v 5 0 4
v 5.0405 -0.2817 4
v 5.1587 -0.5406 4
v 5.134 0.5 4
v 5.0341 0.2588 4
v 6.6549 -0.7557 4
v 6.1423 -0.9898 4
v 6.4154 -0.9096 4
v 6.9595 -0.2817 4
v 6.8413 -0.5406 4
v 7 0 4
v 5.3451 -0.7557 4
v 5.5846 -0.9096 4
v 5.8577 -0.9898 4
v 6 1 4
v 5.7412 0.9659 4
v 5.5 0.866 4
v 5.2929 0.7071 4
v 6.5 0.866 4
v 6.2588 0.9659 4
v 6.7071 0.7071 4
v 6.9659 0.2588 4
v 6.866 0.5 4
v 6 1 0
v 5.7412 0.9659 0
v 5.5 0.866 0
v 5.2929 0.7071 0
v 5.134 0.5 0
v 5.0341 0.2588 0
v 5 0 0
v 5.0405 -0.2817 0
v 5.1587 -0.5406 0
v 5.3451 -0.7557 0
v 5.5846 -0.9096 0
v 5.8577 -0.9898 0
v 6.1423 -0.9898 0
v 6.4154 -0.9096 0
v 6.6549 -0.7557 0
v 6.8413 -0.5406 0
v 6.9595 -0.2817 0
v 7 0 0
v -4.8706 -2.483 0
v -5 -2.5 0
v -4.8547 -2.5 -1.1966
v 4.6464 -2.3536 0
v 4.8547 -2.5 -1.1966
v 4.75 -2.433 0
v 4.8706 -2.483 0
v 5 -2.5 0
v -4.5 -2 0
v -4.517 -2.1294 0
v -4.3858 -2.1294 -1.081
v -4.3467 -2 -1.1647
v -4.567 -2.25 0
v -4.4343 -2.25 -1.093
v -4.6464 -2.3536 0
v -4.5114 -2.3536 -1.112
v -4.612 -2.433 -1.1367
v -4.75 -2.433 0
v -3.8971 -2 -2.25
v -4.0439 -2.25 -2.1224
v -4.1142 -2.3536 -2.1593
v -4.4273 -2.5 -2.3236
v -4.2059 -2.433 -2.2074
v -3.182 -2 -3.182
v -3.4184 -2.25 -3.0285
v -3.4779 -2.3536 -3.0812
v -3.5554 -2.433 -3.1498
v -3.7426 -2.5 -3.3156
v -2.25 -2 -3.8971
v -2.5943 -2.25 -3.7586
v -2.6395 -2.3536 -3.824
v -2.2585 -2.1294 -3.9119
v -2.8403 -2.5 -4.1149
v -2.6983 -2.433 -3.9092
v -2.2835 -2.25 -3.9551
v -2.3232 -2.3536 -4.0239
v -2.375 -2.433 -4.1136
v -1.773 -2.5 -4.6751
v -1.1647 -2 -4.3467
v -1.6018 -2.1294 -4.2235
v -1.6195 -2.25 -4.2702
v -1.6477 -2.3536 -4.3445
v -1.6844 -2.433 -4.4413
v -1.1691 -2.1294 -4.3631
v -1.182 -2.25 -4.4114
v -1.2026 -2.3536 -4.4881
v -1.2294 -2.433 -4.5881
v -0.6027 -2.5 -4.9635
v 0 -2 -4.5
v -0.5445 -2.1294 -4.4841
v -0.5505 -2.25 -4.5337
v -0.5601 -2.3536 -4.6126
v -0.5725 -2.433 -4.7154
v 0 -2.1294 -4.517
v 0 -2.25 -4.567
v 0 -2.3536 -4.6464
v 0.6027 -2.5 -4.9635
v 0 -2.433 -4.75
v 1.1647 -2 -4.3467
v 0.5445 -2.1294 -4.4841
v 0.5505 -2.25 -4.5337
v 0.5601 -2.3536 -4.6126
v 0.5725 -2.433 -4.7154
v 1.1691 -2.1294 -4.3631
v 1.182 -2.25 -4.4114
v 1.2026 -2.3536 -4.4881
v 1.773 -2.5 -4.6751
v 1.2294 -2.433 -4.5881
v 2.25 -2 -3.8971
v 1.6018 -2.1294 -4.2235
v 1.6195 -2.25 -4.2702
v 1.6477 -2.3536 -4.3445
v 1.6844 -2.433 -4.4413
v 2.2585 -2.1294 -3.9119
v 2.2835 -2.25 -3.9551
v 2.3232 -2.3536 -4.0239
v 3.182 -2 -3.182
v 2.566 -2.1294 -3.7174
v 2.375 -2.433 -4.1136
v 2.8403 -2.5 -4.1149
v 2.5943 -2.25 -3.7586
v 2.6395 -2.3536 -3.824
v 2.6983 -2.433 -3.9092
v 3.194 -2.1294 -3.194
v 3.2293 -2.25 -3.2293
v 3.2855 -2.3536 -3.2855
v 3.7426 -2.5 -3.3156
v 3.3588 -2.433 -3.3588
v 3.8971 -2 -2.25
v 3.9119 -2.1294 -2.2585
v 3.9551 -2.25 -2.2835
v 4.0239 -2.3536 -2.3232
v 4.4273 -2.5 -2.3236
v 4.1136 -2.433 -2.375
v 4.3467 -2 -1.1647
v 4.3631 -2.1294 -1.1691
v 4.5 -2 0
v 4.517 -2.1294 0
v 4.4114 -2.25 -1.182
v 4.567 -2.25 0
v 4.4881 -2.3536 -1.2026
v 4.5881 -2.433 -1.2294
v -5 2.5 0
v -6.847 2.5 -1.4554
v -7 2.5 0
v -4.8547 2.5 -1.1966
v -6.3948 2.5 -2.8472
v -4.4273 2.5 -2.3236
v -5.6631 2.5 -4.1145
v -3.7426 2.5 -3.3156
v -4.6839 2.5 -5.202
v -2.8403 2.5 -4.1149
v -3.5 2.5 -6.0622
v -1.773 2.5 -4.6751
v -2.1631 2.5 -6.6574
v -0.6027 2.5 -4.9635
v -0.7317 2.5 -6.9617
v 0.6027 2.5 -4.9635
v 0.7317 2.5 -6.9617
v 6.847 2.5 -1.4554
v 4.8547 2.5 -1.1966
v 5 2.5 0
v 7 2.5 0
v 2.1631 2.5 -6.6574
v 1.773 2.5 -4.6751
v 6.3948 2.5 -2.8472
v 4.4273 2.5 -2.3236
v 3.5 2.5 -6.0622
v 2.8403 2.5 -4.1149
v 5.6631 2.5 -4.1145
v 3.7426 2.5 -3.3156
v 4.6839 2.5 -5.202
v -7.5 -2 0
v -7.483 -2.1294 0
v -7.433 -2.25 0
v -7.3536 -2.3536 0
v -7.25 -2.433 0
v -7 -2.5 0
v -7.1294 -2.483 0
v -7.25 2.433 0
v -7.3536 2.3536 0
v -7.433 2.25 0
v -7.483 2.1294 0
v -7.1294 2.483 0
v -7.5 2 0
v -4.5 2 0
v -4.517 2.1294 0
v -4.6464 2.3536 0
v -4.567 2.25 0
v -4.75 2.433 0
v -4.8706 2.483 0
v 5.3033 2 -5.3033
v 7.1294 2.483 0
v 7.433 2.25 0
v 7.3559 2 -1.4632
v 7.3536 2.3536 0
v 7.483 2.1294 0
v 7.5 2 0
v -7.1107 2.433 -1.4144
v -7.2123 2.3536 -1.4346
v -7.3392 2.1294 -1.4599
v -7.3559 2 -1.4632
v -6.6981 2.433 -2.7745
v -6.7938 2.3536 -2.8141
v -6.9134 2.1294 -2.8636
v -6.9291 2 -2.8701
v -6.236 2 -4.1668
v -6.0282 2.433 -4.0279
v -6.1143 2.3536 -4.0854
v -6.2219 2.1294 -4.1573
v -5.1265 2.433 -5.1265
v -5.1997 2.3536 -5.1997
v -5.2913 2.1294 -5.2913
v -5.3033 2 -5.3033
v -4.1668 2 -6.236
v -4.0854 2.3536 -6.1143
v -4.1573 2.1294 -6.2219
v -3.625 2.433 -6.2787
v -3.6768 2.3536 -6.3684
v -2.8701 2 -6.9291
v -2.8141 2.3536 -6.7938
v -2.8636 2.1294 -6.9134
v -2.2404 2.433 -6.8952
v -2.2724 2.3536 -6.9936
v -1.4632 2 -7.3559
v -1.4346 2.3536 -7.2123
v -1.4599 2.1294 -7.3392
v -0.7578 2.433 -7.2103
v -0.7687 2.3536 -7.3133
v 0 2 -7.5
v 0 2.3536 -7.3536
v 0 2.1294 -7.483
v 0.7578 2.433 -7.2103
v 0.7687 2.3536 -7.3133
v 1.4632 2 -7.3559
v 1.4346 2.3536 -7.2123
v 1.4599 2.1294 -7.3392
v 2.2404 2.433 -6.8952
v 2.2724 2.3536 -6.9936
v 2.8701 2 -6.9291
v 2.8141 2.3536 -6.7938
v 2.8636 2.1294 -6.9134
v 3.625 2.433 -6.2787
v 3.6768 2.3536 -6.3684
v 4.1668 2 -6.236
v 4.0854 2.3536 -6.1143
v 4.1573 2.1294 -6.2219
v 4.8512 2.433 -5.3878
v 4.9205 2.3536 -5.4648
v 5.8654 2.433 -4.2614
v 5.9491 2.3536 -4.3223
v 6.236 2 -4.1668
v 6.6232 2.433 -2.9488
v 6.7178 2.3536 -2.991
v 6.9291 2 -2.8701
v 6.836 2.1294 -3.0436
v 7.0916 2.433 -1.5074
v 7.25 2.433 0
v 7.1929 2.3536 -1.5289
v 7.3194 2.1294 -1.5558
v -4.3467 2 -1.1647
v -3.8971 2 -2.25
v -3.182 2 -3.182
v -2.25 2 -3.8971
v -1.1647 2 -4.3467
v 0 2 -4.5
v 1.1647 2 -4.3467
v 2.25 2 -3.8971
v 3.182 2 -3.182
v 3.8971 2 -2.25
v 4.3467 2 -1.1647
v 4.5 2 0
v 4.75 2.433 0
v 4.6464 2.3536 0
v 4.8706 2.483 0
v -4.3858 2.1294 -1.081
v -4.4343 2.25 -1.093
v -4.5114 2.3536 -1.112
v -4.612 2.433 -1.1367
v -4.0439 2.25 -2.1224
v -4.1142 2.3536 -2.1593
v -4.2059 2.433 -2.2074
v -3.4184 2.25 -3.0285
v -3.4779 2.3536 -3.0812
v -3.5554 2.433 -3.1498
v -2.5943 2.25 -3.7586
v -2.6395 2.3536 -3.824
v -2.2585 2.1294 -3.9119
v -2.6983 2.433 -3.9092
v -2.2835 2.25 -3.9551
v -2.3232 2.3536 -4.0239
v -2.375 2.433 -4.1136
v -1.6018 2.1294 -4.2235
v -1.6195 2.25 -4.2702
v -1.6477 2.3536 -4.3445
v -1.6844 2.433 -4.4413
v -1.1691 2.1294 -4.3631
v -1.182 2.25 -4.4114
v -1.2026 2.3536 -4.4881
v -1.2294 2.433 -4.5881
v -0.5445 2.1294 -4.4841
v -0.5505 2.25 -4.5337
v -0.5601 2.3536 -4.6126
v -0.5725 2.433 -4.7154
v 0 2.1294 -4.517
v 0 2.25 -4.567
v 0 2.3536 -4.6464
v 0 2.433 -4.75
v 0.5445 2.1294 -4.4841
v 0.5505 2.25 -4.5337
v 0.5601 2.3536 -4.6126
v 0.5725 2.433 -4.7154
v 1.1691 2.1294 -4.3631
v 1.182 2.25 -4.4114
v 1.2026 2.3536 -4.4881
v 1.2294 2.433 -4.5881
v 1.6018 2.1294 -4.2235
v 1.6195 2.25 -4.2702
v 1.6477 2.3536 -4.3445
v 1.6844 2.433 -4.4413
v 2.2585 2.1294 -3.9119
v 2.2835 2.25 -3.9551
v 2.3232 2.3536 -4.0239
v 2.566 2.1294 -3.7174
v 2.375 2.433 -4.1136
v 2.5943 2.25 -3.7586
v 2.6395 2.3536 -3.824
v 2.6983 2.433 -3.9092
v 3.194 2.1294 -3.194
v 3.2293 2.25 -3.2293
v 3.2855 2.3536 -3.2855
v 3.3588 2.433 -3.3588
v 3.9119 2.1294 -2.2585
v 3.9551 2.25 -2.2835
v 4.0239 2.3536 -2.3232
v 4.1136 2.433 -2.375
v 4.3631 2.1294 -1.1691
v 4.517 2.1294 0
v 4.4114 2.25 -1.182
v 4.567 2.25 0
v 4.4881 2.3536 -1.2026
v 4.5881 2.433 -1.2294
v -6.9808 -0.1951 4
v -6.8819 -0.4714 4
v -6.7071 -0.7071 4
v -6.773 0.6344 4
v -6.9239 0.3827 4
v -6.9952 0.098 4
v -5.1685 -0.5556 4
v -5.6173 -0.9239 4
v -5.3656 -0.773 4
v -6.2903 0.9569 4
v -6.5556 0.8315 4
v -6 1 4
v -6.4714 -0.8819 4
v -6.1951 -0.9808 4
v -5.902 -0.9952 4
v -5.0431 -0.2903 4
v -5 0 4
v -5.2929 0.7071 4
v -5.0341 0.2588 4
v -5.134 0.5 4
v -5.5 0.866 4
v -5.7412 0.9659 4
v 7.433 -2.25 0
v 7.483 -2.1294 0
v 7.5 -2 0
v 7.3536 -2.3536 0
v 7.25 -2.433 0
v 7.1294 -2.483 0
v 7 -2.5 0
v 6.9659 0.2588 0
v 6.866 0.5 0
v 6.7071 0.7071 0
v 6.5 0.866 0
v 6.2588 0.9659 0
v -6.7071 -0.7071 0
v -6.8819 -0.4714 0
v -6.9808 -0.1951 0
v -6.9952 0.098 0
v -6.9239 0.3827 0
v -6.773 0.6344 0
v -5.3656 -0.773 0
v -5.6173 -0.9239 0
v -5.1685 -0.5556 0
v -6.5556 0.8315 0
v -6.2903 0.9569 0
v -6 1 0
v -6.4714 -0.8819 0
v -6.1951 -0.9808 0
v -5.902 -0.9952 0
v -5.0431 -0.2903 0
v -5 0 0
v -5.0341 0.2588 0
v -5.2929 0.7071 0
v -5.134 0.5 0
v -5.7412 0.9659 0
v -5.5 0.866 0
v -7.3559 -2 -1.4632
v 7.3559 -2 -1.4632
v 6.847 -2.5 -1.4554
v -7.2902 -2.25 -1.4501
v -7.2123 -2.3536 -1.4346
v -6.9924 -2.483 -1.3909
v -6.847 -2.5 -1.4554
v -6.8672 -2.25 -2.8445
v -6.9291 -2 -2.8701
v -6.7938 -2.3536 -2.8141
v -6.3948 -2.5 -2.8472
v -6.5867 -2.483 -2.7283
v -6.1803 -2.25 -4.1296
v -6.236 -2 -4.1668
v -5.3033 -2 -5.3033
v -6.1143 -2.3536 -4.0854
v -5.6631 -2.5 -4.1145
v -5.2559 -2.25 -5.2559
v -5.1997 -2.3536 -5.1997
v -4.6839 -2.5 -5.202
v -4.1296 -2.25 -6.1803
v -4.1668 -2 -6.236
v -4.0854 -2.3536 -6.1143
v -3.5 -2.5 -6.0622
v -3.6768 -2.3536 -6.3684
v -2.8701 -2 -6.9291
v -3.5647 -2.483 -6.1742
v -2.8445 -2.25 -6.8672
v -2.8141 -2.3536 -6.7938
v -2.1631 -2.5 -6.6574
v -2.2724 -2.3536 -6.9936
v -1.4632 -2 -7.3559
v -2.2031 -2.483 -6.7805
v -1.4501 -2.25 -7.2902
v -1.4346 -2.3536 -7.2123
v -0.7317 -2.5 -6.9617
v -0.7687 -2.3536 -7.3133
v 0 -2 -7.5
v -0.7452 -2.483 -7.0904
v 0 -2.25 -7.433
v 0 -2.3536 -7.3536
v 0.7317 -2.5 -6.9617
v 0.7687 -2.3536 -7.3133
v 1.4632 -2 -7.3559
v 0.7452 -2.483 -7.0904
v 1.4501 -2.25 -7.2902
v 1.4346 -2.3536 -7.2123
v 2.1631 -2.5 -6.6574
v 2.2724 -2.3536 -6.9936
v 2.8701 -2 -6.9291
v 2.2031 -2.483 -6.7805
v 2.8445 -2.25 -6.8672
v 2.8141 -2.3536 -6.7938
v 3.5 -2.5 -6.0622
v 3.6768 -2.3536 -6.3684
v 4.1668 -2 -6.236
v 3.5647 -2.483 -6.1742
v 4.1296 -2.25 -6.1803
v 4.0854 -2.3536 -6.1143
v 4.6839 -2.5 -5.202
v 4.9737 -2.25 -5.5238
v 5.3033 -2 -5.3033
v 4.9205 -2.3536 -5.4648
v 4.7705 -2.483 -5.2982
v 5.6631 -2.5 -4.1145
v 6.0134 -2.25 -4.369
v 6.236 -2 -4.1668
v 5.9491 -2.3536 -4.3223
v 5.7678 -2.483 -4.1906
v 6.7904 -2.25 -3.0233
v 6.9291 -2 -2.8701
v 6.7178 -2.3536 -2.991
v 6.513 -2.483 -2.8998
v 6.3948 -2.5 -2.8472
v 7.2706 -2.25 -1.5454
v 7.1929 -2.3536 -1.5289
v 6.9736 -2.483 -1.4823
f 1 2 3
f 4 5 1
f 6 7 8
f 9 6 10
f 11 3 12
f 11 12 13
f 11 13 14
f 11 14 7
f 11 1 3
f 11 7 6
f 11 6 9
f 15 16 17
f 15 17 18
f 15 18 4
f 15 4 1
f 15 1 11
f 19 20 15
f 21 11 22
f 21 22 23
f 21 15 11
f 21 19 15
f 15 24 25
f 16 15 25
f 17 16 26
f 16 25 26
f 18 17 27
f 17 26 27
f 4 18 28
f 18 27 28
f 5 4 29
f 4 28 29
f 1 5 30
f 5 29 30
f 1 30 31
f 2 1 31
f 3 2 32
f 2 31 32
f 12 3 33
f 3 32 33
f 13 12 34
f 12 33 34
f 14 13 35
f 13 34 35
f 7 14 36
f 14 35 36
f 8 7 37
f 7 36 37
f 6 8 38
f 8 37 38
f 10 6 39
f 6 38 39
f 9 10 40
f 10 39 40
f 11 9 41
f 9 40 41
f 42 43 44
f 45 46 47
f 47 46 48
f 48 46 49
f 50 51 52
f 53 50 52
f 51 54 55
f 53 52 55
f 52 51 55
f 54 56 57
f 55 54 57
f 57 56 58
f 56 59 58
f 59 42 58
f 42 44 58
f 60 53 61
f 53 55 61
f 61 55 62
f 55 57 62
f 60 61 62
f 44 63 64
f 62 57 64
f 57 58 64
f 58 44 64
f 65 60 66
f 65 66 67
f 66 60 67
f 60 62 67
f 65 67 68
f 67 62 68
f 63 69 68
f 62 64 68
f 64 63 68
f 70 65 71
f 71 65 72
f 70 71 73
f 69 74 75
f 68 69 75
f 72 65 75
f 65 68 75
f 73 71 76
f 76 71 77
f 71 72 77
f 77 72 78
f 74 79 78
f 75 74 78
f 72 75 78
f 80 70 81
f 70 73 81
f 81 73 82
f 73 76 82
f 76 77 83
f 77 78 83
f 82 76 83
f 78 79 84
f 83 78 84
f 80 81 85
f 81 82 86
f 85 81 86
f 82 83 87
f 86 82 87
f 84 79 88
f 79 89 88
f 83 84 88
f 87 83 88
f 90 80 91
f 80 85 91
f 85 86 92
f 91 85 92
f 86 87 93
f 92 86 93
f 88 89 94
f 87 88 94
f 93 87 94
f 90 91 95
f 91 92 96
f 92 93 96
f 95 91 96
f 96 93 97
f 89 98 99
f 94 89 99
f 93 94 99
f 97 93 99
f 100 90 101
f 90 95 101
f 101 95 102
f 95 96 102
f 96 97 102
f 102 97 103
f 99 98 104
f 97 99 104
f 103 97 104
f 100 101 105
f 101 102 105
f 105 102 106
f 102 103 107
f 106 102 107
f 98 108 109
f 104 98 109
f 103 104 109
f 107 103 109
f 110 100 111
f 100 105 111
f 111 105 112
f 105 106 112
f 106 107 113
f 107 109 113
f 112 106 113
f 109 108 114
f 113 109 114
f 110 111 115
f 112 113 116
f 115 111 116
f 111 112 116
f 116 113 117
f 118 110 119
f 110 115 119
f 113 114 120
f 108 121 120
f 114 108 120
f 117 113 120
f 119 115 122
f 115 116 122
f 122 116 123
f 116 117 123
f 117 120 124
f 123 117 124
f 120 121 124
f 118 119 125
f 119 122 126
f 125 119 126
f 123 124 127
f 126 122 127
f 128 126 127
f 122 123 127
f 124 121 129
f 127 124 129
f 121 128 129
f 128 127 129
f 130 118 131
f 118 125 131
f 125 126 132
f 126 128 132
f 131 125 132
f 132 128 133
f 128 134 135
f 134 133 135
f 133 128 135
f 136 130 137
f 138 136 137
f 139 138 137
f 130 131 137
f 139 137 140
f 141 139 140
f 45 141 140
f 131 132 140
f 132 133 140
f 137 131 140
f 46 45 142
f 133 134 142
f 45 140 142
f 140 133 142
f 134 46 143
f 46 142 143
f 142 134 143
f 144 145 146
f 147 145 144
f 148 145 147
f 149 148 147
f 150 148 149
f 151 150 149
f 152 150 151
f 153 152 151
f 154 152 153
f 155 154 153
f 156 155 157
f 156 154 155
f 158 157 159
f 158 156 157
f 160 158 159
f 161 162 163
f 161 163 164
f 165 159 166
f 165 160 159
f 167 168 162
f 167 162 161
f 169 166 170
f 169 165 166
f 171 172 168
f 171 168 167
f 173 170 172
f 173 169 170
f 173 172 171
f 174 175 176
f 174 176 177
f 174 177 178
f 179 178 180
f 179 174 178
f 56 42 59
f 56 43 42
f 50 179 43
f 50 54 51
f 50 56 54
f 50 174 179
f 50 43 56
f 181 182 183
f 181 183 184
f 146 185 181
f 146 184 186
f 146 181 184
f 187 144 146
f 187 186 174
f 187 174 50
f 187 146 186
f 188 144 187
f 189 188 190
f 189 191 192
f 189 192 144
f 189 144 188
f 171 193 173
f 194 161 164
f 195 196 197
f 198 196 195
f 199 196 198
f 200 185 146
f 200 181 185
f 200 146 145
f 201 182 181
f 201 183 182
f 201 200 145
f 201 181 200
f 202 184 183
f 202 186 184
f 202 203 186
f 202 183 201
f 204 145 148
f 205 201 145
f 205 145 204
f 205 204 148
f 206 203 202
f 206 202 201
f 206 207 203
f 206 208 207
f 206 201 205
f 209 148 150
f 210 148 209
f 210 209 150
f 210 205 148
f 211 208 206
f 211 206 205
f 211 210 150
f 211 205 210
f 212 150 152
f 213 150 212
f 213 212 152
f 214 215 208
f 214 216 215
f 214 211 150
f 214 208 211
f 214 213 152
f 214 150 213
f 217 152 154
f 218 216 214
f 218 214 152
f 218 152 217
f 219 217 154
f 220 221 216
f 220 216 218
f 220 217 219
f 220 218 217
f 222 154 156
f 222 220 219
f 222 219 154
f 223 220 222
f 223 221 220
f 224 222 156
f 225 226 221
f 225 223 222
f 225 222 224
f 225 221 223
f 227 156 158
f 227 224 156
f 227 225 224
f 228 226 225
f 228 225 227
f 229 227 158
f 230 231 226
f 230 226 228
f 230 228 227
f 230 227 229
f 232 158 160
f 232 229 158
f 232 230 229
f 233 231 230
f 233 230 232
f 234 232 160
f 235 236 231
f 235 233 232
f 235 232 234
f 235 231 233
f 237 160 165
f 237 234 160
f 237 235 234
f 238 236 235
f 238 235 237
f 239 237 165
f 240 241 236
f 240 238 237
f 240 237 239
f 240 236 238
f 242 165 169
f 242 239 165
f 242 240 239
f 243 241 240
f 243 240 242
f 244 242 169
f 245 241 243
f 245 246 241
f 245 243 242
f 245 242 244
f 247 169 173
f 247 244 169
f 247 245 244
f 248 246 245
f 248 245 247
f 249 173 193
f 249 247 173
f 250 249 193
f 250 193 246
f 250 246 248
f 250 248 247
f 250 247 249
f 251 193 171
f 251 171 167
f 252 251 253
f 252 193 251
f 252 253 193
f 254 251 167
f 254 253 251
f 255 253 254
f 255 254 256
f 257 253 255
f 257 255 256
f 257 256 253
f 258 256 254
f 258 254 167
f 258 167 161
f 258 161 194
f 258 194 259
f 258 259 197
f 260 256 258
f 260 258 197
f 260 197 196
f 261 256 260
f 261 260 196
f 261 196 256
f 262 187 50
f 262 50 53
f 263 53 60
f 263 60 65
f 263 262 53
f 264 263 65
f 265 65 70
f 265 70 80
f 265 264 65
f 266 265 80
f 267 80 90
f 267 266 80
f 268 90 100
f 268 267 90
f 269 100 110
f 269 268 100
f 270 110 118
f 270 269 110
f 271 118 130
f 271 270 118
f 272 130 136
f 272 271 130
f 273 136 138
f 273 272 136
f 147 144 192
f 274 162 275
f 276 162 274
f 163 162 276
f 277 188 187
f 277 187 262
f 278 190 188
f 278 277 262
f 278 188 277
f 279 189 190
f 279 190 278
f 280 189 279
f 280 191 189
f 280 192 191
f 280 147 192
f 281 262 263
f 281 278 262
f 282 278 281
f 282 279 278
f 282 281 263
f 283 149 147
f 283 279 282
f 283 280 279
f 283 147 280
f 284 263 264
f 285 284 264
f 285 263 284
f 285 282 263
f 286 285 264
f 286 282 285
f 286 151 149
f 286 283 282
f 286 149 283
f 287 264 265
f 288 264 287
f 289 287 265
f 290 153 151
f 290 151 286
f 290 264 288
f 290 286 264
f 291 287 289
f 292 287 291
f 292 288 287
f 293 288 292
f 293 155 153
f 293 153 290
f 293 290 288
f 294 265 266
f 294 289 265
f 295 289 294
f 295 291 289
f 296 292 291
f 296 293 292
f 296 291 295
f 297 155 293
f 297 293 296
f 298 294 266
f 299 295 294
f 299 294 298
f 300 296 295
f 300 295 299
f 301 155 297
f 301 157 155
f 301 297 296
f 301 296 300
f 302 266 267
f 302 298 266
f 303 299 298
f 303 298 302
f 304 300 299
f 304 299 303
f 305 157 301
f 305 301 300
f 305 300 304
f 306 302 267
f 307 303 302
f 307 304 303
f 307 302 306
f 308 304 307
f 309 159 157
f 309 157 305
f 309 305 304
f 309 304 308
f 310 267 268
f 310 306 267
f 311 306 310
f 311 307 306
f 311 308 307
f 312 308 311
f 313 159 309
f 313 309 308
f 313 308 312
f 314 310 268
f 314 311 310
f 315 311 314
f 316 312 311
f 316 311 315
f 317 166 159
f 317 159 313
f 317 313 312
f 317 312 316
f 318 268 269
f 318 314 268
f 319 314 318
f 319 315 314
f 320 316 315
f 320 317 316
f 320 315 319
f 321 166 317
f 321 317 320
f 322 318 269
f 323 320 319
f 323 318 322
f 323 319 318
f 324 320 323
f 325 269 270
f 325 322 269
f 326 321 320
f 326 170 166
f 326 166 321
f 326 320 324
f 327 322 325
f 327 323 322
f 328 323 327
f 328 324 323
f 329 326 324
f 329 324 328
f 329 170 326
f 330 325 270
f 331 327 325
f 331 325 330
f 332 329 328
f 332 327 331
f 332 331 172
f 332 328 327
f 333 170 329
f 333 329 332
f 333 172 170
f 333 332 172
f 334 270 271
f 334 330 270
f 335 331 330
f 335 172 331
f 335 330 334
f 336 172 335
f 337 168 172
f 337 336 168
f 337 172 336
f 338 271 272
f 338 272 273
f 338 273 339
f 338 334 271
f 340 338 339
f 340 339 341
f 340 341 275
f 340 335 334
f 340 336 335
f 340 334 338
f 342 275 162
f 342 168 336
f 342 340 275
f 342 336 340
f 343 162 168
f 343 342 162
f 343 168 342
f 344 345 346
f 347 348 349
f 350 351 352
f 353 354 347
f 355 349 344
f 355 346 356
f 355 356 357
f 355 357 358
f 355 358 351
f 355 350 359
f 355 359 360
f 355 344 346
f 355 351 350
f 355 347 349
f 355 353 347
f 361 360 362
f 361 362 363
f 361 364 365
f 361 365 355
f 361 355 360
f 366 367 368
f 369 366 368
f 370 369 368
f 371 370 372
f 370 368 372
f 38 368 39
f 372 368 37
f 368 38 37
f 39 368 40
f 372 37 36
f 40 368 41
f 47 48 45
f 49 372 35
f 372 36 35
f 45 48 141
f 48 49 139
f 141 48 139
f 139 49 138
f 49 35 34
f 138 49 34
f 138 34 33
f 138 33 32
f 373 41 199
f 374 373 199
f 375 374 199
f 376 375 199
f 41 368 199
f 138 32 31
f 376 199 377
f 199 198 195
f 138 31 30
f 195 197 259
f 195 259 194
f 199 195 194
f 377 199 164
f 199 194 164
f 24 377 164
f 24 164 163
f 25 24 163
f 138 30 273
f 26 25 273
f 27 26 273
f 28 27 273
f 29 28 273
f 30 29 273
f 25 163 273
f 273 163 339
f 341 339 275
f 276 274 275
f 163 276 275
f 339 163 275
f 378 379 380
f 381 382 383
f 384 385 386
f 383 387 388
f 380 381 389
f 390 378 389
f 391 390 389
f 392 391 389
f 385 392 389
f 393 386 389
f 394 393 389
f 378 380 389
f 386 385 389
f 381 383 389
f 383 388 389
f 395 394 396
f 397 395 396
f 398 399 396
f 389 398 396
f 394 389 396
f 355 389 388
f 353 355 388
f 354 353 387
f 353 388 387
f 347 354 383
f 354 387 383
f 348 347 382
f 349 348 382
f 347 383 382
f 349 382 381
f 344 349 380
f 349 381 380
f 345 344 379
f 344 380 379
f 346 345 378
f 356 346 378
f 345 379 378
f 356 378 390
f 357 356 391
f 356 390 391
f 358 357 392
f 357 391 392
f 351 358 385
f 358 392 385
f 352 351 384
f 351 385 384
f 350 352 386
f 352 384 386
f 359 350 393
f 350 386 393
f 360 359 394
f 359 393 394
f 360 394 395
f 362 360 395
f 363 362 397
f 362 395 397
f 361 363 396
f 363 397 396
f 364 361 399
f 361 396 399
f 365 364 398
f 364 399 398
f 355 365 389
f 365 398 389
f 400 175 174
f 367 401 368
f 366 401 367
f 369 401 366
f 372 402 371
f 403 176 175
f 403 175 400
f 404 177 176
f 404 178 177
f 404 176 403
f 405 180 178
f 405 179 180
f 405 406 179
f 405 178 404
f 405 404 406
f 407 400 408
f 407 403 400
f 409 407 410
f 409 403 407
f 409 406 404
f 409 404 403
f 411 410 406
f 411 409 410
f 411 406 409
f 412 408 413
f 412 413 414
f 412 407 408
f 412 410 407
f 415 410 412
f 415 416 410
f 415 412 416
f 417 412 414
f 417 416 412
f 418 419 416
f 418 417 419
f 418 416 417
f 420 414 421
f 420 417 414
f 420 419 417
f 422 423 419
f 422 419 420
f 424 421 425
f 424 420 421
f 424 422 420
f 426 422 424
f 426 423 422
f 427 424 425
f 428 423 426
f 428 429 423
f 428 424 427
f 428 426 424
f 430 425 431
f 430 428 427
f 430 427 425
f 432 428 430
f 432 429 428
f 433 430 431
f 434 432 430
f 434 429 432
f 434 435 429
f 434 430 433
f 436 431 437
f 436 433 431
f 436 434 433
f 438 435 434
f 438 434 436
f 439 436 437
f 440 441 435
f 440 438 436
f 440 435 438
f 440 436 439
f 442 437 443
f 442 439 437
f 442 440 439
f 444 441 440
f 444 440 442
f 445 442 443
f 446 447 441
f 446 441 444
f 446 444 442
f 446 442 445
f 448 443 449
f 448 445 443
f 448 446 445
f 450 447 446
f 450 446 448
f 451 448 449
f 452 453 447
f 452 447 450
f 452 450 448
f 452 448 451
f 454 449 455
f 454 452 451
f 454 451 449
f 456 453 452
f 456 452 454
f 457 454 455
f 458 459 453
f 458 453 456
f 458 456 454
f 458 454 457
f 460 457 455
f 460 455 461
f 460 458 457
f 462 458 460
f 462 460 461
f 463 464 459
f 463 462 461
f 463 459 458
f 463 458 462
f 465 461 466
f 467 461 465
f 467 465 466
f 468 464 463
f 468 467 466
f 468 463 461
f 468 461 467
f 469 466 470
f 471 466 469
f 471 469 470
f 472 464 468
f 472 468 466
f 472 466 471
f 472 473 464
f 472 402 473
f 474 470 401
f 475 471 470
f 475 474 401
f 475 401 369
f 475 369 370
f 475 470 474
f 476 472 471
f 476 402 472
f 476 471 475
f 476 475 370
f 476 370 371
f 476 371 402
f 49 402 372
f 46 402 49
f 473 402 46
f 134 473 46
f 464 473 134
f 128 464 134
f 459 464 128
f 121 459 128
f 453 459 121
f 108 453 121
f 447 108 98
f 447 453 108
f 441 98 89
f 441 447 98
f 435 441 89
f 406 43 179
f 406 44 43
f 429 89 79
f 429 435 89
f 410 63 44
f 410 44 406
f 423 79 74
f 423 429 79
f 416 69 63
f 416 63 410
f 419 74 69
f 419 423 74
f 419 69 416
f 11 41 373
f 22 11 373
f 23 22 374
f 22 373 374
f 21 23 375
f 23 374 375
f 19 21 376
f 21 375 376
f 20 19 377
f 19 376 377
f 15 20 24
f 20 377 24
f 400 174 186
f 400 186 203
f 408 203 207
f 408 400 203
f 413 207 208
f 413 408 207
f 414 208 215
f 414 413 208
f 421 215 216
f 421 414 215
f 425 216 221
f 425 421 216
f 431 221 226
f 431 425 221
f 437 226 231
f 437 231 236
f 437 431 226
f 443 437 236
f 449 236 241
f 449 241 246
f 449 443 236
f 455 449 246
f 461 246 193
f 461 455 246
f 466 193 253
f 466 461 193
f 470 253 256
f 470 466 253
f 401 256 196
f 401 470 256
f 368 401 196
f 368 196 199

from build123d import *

# Parameters (mm, degrees)
F1_ANGLE = 180
F2_R     = 0.5
F3_DEPTH = 4
F5_DEPTH = 4


with BuildPart() as f1:
    # F0 (on Top) → F1 (revolve)
    with BuildSketch(Plane.XY):
        with BuildLine():
            Line((-4.5, -2.5), (-4.5, 0))
            Line((-4.5, 0), (-5, 0))
            ThreePointArc((-5, 0), (-6.7071067812, -0.7071067812), (-6, 1))
            Line((-6, 1), (-6, 2.5))
            Line((-6, 2.5), (-7.5, 2.5))
            Line((-7.5, 2.5), (-7.5, -2.5))
            Line((-7.5, -2.5), (-4.5, -2.5))
        make_face()
        with BuildLine():
            Line((-4.5, 0), (-4.5, 2.5))
            Line((-4.5, 2.5), (-6, 2.5))
            Line((-6, 2.5), (-6, 1))
            ThreePointArc((-6, 1), (-5.2928932188, 0.7071067812), (-5, 0))
            Line((-5, 0), (-4.5, 0))
        make_face()
        with BuildLine():
            ThreePointArc((-6, 1), (-6.7071067812, -0.7071067812), (-5, 0))
            Line((-5, 0), (-6, 0))
            Line((-6, 0), (-6, 1))
        make_face()
        with BuildLine():
            Line((-6, 0), (-5, 0))
            ThreePointArc((-5, 0), (-5.2928932188, 0.7071067812), (-6, 1))
            Line((-6, 1), (-6, 0))
        make_face()
    revolve(axis=Axis((0, 0, 0), (0, -1, 0)), revolution_arc=F1_ANGLE)

    # F2
    f2_edges = [f1.edges().sort_by_distance(p)[0] for p in [
        (0, 2.5, -7.5),
        (0, -2.5, -7.5),
        (0, -2.5, -4.5),
        (0, 2.5, -4.5),
    ]]
    fillet(f2_edges, radius=F2_R)

    # F4 (on face) → F5 (join)
    with BuildSketch(Plane.XY):
        with BuildLine():
            Line((6, 0), (5, 0))
            ThreePointArc((5, 0), (6, -1), (7, 0))
            ThreePointArc((7, 0), (6.7071067812, 0.7071067812), (6, 1))
            Line((6, 1), (6, 0))
        make_face()
        with BuildLine():
            ThreePointArc((6, 1), (5.2928932188, 0.7071067812), (5, 0))
            Line((5, 0), (6, 0))
            Line((6, 0), (6, 1))
        make_face()
    extrude(amount=F5_DEPTH)


with BuildPart() as f3:
    # F0 (on Top) → F3 (new body)
    with BuildSketch(Plane.XY):
        with BuildLine():
            ThreePointArc((-6, 1), (-6.7071067812, -0.7071067812), (-5, 0))
            Line((-5, 0), (-6, 0))
            Line((-6, 0), (-6, 1))
        make_face()
        with BuildLine():
            Line((-6, 0), (-5, 0))
            ThreePointArc((-5, 0), (-5.2928932188, 0.7071067812), (-6, 1))
            Line((-6, 1), (-6, 0))
        make_face()
    extrude(amount=F3_DEPTH)


solid = Compound([f1.part, f3.part])
